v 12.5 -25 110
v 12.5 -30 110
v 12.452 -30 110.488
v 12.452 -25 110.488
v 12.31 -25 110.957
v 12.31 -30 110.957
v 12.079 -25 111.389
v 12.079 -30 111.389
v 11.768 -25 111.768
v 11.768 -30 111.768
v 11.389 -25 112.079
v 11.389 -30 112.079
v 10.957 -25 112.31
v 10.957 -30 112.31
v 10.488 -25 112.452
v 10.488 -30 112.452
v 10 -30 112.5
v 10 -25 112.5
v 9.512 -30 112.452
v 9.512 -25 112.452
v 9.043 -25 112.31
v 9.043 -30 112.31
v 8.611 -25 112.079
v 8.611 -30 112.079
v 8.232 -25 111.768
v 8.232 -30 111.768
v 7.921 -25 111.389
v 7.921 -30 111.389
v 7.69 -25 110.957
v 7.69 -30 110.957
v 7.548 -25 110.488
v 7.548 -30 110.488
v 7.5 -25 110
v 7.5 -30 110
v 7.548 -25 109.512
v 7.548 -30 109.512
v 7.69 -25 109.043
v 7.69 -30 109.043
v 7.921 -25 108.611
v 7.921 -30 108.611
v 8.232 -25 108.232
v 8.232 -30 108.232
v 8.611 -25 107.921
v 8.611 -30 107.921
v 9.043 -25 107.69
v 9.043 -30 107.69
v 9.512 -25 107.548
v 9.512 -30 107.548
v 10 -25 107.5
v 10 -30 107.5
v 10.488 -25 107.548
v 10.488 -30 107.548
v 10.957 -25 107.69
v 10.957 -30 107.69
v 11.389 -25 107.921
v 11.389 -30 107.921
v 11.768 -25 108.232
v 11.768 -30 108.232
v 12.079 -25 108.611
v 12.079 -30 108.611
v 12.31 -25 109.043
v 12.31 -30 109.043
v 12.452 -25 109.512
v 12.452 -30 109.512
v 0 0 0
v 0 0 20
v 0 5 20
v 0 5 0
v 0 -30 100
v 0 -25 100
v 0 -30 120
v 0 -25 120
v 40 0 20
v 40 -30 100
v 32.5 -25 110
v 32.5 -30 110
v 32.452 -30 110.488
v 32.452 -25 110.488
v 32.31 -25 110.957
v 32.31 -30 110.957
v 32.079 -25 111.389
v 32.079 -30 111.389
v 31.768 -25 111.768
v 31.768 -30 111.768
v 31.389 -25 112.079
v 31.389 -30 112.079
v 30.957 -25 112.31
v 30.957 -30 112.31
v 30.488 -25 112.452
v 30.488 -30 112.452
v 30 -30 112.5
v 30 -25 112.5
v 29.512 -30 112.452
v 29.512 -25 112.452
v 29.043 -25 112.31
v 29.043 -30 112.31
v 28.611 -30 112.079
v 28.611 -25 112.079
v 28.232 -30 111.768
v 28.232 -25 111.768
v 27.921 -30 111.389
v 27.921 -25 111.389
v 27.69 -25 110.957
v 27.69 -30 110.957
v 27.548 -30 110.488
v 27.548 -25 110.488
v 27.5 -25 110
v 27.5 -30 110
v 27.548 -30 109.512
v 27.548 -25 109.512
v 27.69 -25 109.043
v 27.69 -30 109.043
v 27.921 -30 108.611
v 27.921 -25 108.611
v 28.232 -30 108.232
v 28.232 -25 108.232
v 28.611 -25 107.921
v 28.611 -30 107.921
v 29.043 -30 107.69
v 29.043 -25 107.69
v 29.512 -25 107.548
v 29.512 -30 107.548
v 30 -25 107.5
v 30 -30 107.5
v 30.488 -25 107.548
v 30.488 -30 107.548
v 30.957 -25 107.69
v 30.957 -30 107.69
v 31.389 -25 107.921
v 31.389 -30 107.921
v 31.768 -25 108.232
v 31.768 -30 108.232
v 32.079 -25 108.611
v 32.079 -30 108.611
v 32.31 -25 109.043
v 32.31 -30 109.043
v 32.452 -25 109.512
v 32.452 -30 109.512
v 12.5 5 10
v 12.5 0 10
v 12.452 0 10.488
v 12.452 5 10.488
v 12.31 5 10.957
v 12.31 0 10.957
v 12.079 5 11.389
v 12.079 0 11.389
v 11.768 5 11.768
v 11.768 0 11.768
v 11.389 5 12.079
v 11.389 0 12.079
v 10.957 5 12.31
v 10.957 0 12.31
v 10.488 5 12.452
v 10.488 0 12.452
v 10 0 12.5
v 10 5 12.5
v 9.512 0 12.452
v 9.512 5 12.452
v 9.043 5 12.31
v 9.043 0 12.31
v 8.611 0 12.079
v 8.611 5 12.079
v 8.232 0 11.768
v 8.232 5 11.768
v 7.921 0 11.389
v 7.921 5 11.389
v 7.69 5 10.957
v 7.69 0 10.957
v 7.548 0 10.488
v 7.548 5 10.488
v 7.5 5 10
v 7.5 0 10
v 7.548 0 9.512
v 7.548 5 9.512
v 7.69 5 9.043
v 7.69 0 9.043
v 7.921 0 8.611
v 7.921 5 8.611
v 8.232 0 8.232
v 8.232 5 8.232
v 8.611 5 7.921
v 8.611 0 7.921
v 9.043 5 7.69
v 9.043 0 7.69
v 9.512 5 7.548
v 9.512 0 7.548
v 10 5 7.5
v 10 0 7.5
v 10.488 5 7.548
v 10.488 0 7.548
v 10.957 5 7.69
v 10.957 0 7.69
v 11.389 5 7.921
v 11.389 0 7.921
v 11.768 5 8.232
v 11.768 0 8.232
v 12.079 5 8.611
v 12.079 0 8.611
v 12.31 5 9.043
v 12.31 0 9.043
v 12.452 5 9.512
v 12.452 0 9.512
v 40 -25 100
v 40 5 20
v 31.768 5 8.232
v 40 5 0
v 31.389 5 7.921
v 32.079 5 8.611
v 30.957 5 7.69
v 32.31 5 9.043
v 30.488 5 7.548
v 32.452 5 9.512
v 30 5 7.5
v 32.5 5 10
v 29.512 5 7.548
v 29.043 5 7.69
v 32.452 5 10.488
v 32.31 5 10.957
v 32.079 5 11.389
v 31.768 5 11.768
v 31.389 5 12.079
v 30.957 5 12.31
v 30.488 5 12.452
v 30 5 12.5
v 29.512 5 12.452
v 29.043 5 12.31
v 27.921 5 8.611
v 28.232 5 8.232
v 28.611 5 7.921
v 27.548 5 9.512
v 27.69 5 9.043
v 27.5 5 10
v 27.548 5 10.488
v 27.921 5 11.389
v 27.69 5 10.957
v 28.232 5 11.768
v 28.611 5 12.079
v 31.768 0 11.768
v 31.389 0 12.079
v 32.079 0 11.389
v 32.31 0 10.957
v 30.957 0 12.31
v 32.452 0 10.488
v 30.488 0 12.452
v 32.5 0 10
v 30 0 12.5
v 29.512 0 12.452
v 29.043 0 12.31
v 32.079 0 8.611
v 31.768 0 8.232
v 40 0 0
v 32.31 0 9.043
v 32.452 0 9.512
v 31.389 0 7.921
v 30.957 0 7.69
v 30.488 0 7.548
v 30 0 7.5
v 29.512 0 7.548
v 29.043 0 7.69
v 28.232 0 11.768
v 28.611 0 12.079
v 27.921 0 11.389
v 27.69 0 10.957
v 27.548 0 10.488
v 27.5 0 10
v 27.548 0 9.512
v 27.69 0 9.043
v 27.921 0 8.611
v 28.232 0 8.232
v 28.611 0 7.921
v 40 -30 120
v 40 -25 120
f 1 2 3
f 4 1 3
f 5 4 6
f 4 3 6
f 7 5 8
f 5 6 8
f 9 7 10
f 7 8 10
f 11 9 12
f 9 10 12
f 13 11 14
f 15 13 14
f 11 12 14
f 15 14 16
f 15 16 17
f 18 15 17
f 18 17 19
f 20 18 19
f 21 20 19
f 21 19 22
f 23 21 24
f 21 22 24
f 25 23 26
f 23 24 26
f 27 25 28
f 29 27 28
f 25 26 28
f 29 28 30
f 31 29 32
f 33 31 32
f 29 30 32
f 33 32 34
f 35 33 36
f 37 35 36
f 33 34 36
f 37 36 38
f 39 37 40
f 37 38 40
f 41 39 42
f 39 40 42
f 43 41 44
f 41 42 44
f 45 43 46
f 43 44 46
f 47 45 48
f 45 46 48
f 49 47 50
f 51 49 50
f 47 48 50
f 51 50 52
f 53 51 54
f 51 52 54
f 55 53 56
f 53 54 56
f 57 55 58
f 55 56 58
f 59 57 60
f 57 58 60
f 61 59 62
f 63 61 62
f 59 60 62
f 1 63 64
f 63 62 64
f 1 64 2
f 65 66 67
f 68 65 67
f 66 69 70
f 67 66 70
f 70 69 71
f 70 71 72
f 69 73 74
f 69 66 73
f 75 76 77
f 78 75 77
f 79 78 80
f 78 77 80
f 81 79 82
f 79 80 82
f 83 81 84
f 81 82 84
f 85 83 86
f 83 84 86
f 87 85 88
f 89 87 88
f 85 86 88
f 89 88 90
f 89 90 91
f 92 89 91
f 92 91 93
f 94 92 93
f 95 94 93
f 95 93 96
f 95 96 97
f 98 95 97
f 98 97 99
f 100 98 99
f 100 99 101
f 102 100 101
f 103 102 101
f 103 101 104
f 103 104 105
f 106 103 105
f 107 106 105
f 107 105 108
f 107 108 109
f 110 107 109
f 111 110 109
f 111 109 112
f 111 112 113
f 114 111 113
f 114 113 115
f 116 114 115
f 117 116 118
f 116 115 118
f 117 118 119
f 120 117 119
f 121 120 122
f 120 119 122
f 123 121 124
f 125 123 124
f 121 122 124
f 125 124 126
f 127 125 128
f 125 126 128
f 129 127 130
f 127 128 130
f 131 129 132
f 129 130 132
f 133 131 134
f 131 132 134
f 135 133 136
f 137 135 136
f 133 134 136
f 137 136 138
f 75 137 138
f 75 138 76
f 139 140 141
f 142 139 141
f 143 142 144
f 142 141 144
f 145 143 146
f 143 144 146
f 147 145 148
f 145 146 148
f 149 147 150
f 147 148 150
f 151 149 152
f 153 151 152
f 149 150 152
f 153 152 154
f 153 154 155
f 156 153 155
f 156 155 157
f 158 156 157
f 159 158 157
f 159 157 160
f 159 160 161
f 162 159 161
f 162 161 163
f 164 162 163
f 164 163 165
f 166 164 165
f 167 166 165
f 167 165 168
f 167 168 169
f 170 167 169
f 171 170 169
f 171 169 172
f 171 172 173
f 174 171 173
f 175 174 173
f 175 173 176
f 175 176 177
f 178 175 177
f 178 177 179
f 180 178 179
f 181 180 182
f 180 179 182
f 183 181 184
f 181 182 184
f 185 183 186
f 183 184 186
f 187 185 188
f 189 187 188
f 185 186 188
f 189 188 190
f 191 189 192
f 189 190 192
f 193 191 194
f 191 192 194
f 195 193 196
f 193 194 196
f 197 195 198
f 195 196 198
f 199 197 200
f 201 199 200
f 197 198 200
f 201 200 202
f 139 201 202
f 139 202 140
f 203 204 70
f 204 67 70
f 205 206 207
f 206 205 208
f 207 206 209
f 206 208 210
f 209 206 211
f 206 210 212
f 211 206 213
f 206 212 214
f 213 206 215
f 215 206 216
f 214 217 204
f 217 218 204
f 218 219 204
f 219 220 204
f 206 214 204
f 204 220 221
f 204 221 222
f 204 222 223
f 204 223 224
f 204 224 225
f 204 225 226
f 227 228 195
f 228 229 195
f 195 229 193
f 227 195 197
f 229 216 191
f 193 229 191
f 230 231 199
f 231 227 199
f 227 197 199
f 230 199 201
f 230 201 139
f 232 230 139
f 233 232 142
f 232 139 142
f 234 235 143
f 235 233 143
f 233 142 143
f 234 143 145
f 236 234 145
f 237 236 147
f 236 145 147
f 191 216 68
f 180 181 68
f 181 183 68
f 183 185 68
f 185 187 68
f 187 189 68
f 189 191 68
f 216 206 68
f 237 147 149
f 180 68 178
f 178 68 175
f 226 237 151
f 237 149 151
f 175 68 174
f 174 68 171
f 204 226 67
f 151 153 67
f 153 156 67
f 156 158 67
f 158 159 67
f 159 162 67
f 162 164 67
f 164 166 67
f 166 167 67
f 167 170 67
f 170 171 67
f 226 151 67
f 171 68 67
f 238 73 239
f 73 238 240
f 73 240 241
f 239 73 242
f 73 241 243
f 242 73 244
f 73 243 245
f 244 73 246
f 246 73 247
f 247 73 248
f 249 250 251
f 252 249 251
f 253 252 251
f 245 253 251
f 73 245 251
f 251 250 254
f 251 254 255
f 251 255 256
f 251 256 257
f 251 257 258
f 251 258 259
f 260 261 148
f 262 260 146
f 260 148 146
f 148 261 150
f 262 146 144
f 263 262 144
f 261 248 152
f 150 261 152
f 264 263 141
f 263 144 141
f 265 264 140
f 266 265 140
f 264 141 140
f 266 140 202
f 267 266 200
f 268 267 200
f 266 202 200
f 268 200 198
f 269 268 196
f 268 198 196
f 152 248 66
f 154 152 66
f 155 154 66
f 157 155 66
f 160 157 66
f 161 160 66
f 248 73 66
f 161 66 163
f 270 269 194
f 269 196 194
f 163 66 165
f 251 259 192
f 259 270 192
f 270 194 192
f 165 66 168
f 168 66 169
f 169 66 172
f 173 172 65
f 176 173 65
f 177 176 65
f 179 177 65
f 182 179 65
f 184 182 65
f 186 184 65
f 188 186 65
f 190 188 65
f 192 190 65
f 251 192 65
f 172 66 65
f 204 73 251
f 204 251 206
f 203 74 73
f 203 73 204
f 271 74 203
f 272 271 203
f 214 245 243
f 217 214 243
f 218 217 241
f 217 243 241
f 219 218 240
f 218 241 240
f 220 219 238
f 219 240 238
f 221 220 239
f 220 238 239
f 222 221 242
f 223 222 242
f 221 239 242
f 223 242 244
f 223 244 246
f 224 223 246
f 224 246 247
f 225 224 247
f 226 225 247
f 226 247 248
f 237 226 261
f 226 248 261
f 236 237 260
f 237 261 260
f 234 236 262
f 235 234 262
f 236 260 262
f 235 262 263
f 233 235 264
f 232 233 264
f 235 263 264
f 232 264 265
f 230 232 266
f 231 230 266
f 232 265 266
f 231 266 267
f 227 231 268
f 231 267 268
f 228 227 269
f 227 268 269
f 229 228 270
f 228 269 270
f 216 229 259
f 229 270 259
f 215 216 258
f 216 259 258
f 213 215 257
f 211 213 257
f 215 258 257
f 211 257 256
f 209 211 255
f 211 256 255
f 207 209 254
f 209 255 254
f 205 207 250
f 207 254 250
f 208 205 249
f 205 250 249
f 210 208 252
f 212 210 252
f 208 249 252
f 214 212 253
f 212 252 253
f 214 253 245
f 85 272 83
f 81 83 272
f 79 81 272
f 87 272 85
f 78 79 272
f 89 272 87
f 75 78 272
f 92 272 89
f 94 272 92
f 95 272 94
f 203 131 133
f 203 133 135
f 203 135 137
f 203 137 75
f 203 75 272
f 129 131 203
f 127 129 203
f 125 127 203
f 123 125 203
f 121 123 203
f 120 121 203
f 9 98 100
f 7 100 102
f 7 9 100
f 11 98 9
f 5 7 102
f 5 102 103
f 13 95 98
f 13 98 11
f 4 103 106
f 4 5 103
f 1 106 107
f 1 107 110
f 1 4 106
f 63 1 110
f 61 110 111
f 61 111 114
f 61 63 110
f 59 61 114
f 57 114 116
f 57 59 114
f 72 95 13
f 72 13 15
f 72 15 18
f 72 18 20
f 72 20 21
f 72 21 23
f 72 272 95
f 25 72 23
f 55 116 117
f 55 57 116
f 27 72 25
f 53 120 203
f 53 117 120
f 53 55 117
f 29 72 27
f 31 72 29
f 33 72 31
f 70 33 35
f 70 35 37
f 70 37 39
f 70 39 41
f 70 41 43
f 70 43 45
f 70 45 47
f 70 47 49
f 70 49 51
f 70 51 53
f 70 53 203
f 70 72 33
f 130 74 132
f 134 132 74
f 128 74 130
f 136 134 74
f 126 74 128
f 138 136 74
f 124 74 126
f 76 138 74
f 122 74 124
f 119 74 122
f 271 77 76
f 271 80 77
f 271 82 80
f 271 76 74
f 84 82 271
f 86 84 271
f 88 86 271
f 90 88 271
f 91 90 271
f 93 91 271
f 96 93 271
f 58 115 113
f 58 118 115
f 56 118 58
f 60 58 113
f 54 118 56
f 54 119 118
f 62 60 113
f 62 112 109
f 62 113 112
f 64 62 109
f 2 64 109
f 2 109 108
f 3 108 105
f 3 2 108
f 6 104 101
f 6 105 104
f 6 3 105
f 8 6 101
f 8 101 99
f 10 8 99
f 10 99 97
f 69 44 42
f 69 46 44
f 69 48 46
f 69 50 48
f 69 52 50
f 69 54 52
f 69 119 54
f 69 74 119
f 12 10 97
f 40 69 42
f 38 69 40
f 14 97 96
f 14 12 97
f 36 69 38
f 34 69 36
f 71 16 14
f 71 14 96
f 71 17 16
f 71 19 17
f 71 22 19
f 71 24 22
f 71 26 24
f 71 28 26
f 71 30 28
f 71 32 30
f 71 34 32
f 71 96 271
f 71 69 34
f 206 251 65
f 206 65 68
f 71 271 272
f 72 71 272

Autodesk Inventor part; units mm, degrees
ref_plane "YZ Plane" through (0, 0, 0) normal (1, 0, 0) x (0, 1, 0)
ref_plane "XZ Plane" through (0, 0, 0) normal (0, 1, 0) x (-1, 0, 0)
ref_plane "XY Plane" through (0, 0, 0) normal (0, 0, 1) x (1, 0, 0)
sketch "Sketch1" plane through (0, 0, 0) normal (1, 0, 0) x (0, 1, 0)
  line L0 (0, 0) -> (5, 0)
  line L1 (5, 0) -> (5, 20)
  line L2 (5, 20) -> (0, 20)
  line L3 (0, 20) -> (0, 0)
  line L4 (-25, 100) -> (-30, 100)
  line L5 (-30, 100) -> (-30, 120)
  line L6 (-30, 120) -> (-25, 120)
  line L7 (-25, 120) -> (-25, 100)
  line L8 (5, 20) -> (-25, 100)
  line L9 (0, 20) -> (-30, 100)
  dimension "d0" = 5
  dimension "d1" = 20
  dimension "d2" = 5
  dimension "d3" = 20
  dimension "d4" = 35
  dimension "d5" = 120
extrude "Extrusion1" add sketch "Sketch1" along normal blind 40
sketch "Sketch2" plane through (0, 0, 0) normal (0, -1, 0) x (1, 0, 0)
  circle A0 centre (30, 10) radius 2.5
  circle A1 centre (10, 10) radius 2.5
  circle A2 centre (30, 110) radius 2.5
  circle A3 centre (10, 110) radius 2.5
  line L0 (40, 120) -> (40, 100) projected
  line L1 (0, 120) -> (40, 120) projected
  line L2 (0, 120) -> (0, 100) projected
  line L3 (0, 20) -> (0, 0) projected
  line L4 (40, 20) -> (40, 0) projected
  line L5 (0, 0) -> (40, 0) projected
  dimension "d8" = 5
  dimension "d9" = 5
  dimension "d10" = 5
  dimension "d11" = 5
  dimension "d12" = 10
  dimension "d13" = 10
  dimension "d14" = 10
  dimension "d15" = 10
  dimension "d16" = 10
  dimension "d17" = 10
  dimension "d18" = 10
  dimension "d19" = 10
extrude "Extrusion2" cut sketch "Sketch2" against normal mid plane 90
properties part number "BracketControlPannel"
